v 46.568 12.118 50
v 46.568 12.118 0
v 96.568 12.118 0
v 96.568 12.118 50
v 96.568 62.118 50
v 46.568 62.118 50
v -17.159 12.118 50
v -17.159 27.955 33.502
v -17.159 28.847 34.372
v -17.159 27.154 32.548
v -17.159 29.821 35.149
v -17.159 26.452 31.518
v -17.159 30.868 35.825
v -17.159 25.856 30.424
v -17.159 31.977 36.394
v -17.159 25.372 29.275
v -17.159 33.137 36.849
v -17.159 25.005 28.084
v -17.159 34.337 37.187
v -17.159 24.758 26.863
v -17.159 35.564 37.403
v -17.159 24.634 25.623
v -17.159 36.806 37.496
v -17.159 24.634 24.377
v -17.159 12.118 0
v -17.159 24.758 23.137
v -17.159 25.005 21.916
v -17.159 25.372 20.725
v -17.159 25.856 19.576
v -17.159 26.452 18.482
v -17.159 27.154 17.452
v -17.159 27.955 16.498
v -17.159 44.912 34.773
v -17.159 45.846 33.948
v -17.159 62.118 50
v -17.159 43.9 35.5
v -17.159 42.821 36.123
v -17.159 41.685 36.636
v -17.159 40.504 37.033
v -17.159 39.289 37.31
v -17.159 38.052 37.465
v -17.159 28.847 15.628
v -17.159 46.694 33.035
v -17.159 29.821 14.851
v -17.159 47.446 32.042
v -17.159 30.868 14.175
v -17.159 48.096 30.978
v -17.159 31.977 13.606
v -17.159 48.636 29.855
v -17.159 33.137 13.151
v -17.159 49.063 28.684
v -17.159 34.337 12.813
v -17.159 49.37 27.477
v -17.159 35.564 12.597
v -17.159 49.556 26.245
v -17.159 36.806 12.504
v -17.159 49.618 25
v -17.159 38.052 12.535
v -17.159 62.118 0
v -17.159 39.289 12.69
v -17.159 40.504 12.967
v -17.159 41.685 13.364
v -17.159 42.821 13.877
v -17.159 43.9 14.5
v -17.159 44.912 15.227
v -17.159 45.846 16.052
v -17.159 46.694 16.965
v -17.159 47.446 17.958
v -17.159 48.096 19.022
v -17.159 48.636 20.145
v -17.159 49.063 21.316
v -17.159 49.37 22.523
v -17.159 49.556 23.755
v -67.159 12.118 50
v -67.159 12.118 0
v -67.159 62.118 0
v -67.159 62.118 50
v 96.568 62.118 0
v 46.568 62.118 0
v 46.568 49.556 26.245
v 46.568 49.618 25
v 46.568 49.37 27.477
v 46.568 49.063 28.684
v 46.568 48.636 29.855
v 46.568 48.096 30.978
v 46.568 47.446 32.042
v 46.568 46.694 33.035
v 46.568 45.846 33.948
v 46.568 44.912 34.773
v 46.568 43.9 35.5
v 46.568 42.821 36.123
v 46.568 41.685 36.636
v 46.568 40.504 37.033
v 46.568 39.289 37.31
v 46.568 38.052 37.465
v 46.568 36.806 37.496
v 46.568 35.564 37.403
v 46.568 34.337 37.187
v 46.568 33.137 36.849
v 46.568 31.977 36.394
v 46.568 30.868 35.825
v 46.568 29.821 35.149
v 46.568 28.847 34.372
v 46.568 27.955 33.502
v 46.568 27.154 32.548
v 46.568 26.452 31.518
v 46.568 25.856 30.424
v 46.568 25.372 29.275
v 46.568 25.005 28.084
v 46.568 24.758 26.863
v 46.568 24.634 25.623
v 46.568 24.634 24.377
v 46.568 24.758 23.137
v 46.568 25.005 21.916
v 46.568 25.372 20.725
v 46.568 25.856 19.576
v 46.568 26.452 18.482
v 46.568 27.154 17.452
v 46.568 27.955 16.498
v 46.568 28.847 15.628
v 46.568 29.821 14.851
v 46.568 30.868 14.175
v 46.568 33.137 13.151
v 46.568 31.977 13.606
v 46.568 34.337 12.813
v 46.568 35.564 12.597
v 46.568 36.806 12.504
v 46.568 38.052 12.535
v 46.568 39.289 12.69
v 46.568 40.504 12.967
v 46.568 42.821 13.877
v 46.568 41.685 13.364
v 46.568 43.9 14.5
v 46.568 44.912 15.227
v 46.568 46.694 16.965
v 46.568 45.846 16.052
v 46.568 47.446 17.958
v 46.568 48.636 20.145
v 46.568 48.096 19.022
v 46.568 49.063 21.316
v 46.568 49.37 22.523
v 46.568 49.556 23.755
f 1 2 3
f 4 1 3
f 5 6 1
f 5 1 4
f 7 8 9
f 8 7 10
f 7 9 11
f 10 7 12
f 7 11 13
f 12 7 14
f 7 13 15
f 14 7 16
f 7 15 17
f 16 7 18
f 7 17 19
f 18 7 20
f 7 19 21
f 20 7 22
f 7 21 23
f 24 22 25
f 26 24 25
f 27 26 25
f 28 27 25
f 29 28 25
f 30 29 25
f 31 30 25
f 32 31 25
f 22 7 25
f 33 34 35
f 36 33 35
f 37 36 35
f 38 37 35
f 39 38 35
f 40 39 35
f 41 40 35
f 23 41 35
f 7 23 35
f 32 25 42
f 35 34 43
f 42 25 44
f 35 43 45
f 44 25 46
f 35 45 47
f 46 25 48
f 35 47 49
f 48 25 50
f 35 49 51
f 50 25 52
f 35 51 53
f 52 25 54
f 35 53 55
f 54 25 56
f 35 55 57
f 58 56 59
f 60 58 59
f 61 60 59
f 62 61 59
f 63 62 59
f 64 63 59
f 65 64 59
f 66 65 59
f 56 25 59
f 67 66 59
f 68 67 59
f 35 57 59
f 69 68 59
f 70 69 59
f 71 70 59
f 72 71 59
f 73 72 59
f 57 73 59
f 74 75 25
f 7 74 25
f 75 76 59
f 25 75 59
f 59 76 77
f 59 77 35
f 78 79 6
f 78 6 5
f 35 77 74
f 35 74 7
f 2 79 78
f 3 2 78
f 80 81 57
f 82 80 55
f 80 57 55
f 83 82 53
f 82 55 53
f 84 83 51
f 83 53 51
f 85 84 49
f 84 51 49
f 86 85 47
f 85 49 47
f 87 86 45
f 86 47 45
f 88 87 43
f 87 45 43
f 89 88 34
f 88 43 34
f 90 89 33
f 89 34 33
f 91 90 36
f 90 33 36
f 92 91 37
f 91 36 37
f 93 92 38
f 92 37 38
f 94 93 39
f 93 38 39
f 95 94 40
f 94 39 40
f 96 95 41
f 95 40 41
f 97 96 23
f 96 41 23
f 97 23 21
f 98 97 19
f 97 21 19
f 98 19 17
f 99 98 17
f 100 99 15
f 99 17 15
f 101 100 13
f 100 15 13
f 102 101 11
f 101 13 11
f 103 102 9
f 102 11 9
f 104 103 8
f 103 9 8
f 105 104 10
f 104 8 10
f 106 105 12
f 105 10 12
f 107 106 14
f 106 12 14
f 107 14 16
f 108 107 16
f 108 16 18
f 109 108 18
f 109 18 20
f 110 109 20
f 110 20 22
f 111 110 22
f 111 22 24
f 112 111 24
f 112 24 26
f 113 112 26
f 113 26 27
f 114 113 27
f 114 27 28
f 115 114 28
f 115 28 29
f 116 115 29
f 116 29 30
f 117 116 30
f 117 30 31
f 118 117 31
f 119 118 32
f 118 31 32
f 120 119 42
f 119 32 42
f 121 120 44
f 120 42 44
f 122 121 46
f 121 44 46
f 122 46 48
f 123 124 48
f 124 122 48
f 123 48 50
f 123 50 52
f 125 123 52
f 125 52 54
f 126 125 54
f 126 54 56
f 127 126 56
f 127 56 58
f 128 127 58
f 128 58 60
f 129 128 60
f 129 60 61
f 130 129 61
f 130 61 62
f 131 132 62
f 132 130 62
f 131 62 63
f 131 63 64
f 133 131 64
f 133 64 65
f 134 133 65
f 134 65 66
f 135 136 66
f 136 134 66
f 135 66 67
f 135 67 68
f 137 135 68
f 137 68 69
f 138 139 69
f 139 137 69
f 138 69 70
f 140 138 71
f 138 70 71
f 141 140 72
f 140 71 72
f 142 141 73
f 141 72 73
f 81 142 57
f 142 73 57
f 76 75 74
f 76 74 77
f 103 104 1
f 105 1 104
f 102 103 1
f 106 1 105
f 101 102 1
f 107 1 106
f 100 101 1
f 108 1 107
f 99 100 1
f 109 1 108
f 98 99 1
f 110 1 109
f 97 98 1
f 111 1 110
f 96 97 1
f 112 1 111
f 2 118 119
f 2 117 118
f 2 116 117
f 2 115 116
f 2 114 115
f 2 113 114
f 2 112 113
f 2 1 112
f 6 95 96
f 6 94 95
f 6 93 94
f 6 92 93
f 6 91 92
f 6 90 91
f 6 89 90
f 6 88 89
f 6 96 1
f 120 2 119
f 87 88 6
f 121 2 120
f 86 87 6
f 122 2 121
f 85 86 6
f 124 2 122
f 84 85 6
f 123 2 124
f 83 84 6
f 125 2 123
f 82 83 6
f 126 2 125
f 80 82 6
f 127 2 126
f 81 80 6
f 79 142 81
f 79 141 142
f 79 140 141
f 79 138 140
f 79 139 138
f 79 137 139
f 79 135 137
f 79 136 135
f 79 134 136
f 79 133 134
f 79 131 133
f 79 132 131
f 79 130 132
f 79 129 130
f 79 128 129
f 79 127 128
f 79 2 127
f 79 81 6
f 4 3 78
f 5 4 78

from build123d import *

# Parameters (mm, degrees)
F0_W     = 50
F0_H     = 50
F1_DEPTH = 50
F2_W     = 50
F2_H     = 50
F3_DEPTH = 50
F4_R     = 12.5
F5_DEPTH = 63.726814


with BuildPart() as f1:
    # F0 (on Top) → F1 (new body)
    with BuildSketch(Plane.XY):
        with Locations((-42.158758, 37.118042)):
            Rectangle(F0_W, F0_H)
    extrude(amount=F1_DEPTH)



with BuildPart() as f3:
    # F2 (on Top) → F3 (new body, through all)
    with BuildSketch(Plane.XY):
        with Locations((71.568055, 37.118042)):
            Rectangle(F2_W, F2_H)
    extrude(amount=F3_DEPTH)


with BuildPart() as f1_1:
    add(f1.part)

    add(f3.part)  # F5 merges F3
    # F4 (on face) → F5 (join, through all)
    with BuildSketch(Plane.YZ.offset(-17.158758)):
        with Locations((37.118042, 25)):
            Circle(F4_R)
    extrude(amount=F5_DEPTH)


solid = f1_1.part
